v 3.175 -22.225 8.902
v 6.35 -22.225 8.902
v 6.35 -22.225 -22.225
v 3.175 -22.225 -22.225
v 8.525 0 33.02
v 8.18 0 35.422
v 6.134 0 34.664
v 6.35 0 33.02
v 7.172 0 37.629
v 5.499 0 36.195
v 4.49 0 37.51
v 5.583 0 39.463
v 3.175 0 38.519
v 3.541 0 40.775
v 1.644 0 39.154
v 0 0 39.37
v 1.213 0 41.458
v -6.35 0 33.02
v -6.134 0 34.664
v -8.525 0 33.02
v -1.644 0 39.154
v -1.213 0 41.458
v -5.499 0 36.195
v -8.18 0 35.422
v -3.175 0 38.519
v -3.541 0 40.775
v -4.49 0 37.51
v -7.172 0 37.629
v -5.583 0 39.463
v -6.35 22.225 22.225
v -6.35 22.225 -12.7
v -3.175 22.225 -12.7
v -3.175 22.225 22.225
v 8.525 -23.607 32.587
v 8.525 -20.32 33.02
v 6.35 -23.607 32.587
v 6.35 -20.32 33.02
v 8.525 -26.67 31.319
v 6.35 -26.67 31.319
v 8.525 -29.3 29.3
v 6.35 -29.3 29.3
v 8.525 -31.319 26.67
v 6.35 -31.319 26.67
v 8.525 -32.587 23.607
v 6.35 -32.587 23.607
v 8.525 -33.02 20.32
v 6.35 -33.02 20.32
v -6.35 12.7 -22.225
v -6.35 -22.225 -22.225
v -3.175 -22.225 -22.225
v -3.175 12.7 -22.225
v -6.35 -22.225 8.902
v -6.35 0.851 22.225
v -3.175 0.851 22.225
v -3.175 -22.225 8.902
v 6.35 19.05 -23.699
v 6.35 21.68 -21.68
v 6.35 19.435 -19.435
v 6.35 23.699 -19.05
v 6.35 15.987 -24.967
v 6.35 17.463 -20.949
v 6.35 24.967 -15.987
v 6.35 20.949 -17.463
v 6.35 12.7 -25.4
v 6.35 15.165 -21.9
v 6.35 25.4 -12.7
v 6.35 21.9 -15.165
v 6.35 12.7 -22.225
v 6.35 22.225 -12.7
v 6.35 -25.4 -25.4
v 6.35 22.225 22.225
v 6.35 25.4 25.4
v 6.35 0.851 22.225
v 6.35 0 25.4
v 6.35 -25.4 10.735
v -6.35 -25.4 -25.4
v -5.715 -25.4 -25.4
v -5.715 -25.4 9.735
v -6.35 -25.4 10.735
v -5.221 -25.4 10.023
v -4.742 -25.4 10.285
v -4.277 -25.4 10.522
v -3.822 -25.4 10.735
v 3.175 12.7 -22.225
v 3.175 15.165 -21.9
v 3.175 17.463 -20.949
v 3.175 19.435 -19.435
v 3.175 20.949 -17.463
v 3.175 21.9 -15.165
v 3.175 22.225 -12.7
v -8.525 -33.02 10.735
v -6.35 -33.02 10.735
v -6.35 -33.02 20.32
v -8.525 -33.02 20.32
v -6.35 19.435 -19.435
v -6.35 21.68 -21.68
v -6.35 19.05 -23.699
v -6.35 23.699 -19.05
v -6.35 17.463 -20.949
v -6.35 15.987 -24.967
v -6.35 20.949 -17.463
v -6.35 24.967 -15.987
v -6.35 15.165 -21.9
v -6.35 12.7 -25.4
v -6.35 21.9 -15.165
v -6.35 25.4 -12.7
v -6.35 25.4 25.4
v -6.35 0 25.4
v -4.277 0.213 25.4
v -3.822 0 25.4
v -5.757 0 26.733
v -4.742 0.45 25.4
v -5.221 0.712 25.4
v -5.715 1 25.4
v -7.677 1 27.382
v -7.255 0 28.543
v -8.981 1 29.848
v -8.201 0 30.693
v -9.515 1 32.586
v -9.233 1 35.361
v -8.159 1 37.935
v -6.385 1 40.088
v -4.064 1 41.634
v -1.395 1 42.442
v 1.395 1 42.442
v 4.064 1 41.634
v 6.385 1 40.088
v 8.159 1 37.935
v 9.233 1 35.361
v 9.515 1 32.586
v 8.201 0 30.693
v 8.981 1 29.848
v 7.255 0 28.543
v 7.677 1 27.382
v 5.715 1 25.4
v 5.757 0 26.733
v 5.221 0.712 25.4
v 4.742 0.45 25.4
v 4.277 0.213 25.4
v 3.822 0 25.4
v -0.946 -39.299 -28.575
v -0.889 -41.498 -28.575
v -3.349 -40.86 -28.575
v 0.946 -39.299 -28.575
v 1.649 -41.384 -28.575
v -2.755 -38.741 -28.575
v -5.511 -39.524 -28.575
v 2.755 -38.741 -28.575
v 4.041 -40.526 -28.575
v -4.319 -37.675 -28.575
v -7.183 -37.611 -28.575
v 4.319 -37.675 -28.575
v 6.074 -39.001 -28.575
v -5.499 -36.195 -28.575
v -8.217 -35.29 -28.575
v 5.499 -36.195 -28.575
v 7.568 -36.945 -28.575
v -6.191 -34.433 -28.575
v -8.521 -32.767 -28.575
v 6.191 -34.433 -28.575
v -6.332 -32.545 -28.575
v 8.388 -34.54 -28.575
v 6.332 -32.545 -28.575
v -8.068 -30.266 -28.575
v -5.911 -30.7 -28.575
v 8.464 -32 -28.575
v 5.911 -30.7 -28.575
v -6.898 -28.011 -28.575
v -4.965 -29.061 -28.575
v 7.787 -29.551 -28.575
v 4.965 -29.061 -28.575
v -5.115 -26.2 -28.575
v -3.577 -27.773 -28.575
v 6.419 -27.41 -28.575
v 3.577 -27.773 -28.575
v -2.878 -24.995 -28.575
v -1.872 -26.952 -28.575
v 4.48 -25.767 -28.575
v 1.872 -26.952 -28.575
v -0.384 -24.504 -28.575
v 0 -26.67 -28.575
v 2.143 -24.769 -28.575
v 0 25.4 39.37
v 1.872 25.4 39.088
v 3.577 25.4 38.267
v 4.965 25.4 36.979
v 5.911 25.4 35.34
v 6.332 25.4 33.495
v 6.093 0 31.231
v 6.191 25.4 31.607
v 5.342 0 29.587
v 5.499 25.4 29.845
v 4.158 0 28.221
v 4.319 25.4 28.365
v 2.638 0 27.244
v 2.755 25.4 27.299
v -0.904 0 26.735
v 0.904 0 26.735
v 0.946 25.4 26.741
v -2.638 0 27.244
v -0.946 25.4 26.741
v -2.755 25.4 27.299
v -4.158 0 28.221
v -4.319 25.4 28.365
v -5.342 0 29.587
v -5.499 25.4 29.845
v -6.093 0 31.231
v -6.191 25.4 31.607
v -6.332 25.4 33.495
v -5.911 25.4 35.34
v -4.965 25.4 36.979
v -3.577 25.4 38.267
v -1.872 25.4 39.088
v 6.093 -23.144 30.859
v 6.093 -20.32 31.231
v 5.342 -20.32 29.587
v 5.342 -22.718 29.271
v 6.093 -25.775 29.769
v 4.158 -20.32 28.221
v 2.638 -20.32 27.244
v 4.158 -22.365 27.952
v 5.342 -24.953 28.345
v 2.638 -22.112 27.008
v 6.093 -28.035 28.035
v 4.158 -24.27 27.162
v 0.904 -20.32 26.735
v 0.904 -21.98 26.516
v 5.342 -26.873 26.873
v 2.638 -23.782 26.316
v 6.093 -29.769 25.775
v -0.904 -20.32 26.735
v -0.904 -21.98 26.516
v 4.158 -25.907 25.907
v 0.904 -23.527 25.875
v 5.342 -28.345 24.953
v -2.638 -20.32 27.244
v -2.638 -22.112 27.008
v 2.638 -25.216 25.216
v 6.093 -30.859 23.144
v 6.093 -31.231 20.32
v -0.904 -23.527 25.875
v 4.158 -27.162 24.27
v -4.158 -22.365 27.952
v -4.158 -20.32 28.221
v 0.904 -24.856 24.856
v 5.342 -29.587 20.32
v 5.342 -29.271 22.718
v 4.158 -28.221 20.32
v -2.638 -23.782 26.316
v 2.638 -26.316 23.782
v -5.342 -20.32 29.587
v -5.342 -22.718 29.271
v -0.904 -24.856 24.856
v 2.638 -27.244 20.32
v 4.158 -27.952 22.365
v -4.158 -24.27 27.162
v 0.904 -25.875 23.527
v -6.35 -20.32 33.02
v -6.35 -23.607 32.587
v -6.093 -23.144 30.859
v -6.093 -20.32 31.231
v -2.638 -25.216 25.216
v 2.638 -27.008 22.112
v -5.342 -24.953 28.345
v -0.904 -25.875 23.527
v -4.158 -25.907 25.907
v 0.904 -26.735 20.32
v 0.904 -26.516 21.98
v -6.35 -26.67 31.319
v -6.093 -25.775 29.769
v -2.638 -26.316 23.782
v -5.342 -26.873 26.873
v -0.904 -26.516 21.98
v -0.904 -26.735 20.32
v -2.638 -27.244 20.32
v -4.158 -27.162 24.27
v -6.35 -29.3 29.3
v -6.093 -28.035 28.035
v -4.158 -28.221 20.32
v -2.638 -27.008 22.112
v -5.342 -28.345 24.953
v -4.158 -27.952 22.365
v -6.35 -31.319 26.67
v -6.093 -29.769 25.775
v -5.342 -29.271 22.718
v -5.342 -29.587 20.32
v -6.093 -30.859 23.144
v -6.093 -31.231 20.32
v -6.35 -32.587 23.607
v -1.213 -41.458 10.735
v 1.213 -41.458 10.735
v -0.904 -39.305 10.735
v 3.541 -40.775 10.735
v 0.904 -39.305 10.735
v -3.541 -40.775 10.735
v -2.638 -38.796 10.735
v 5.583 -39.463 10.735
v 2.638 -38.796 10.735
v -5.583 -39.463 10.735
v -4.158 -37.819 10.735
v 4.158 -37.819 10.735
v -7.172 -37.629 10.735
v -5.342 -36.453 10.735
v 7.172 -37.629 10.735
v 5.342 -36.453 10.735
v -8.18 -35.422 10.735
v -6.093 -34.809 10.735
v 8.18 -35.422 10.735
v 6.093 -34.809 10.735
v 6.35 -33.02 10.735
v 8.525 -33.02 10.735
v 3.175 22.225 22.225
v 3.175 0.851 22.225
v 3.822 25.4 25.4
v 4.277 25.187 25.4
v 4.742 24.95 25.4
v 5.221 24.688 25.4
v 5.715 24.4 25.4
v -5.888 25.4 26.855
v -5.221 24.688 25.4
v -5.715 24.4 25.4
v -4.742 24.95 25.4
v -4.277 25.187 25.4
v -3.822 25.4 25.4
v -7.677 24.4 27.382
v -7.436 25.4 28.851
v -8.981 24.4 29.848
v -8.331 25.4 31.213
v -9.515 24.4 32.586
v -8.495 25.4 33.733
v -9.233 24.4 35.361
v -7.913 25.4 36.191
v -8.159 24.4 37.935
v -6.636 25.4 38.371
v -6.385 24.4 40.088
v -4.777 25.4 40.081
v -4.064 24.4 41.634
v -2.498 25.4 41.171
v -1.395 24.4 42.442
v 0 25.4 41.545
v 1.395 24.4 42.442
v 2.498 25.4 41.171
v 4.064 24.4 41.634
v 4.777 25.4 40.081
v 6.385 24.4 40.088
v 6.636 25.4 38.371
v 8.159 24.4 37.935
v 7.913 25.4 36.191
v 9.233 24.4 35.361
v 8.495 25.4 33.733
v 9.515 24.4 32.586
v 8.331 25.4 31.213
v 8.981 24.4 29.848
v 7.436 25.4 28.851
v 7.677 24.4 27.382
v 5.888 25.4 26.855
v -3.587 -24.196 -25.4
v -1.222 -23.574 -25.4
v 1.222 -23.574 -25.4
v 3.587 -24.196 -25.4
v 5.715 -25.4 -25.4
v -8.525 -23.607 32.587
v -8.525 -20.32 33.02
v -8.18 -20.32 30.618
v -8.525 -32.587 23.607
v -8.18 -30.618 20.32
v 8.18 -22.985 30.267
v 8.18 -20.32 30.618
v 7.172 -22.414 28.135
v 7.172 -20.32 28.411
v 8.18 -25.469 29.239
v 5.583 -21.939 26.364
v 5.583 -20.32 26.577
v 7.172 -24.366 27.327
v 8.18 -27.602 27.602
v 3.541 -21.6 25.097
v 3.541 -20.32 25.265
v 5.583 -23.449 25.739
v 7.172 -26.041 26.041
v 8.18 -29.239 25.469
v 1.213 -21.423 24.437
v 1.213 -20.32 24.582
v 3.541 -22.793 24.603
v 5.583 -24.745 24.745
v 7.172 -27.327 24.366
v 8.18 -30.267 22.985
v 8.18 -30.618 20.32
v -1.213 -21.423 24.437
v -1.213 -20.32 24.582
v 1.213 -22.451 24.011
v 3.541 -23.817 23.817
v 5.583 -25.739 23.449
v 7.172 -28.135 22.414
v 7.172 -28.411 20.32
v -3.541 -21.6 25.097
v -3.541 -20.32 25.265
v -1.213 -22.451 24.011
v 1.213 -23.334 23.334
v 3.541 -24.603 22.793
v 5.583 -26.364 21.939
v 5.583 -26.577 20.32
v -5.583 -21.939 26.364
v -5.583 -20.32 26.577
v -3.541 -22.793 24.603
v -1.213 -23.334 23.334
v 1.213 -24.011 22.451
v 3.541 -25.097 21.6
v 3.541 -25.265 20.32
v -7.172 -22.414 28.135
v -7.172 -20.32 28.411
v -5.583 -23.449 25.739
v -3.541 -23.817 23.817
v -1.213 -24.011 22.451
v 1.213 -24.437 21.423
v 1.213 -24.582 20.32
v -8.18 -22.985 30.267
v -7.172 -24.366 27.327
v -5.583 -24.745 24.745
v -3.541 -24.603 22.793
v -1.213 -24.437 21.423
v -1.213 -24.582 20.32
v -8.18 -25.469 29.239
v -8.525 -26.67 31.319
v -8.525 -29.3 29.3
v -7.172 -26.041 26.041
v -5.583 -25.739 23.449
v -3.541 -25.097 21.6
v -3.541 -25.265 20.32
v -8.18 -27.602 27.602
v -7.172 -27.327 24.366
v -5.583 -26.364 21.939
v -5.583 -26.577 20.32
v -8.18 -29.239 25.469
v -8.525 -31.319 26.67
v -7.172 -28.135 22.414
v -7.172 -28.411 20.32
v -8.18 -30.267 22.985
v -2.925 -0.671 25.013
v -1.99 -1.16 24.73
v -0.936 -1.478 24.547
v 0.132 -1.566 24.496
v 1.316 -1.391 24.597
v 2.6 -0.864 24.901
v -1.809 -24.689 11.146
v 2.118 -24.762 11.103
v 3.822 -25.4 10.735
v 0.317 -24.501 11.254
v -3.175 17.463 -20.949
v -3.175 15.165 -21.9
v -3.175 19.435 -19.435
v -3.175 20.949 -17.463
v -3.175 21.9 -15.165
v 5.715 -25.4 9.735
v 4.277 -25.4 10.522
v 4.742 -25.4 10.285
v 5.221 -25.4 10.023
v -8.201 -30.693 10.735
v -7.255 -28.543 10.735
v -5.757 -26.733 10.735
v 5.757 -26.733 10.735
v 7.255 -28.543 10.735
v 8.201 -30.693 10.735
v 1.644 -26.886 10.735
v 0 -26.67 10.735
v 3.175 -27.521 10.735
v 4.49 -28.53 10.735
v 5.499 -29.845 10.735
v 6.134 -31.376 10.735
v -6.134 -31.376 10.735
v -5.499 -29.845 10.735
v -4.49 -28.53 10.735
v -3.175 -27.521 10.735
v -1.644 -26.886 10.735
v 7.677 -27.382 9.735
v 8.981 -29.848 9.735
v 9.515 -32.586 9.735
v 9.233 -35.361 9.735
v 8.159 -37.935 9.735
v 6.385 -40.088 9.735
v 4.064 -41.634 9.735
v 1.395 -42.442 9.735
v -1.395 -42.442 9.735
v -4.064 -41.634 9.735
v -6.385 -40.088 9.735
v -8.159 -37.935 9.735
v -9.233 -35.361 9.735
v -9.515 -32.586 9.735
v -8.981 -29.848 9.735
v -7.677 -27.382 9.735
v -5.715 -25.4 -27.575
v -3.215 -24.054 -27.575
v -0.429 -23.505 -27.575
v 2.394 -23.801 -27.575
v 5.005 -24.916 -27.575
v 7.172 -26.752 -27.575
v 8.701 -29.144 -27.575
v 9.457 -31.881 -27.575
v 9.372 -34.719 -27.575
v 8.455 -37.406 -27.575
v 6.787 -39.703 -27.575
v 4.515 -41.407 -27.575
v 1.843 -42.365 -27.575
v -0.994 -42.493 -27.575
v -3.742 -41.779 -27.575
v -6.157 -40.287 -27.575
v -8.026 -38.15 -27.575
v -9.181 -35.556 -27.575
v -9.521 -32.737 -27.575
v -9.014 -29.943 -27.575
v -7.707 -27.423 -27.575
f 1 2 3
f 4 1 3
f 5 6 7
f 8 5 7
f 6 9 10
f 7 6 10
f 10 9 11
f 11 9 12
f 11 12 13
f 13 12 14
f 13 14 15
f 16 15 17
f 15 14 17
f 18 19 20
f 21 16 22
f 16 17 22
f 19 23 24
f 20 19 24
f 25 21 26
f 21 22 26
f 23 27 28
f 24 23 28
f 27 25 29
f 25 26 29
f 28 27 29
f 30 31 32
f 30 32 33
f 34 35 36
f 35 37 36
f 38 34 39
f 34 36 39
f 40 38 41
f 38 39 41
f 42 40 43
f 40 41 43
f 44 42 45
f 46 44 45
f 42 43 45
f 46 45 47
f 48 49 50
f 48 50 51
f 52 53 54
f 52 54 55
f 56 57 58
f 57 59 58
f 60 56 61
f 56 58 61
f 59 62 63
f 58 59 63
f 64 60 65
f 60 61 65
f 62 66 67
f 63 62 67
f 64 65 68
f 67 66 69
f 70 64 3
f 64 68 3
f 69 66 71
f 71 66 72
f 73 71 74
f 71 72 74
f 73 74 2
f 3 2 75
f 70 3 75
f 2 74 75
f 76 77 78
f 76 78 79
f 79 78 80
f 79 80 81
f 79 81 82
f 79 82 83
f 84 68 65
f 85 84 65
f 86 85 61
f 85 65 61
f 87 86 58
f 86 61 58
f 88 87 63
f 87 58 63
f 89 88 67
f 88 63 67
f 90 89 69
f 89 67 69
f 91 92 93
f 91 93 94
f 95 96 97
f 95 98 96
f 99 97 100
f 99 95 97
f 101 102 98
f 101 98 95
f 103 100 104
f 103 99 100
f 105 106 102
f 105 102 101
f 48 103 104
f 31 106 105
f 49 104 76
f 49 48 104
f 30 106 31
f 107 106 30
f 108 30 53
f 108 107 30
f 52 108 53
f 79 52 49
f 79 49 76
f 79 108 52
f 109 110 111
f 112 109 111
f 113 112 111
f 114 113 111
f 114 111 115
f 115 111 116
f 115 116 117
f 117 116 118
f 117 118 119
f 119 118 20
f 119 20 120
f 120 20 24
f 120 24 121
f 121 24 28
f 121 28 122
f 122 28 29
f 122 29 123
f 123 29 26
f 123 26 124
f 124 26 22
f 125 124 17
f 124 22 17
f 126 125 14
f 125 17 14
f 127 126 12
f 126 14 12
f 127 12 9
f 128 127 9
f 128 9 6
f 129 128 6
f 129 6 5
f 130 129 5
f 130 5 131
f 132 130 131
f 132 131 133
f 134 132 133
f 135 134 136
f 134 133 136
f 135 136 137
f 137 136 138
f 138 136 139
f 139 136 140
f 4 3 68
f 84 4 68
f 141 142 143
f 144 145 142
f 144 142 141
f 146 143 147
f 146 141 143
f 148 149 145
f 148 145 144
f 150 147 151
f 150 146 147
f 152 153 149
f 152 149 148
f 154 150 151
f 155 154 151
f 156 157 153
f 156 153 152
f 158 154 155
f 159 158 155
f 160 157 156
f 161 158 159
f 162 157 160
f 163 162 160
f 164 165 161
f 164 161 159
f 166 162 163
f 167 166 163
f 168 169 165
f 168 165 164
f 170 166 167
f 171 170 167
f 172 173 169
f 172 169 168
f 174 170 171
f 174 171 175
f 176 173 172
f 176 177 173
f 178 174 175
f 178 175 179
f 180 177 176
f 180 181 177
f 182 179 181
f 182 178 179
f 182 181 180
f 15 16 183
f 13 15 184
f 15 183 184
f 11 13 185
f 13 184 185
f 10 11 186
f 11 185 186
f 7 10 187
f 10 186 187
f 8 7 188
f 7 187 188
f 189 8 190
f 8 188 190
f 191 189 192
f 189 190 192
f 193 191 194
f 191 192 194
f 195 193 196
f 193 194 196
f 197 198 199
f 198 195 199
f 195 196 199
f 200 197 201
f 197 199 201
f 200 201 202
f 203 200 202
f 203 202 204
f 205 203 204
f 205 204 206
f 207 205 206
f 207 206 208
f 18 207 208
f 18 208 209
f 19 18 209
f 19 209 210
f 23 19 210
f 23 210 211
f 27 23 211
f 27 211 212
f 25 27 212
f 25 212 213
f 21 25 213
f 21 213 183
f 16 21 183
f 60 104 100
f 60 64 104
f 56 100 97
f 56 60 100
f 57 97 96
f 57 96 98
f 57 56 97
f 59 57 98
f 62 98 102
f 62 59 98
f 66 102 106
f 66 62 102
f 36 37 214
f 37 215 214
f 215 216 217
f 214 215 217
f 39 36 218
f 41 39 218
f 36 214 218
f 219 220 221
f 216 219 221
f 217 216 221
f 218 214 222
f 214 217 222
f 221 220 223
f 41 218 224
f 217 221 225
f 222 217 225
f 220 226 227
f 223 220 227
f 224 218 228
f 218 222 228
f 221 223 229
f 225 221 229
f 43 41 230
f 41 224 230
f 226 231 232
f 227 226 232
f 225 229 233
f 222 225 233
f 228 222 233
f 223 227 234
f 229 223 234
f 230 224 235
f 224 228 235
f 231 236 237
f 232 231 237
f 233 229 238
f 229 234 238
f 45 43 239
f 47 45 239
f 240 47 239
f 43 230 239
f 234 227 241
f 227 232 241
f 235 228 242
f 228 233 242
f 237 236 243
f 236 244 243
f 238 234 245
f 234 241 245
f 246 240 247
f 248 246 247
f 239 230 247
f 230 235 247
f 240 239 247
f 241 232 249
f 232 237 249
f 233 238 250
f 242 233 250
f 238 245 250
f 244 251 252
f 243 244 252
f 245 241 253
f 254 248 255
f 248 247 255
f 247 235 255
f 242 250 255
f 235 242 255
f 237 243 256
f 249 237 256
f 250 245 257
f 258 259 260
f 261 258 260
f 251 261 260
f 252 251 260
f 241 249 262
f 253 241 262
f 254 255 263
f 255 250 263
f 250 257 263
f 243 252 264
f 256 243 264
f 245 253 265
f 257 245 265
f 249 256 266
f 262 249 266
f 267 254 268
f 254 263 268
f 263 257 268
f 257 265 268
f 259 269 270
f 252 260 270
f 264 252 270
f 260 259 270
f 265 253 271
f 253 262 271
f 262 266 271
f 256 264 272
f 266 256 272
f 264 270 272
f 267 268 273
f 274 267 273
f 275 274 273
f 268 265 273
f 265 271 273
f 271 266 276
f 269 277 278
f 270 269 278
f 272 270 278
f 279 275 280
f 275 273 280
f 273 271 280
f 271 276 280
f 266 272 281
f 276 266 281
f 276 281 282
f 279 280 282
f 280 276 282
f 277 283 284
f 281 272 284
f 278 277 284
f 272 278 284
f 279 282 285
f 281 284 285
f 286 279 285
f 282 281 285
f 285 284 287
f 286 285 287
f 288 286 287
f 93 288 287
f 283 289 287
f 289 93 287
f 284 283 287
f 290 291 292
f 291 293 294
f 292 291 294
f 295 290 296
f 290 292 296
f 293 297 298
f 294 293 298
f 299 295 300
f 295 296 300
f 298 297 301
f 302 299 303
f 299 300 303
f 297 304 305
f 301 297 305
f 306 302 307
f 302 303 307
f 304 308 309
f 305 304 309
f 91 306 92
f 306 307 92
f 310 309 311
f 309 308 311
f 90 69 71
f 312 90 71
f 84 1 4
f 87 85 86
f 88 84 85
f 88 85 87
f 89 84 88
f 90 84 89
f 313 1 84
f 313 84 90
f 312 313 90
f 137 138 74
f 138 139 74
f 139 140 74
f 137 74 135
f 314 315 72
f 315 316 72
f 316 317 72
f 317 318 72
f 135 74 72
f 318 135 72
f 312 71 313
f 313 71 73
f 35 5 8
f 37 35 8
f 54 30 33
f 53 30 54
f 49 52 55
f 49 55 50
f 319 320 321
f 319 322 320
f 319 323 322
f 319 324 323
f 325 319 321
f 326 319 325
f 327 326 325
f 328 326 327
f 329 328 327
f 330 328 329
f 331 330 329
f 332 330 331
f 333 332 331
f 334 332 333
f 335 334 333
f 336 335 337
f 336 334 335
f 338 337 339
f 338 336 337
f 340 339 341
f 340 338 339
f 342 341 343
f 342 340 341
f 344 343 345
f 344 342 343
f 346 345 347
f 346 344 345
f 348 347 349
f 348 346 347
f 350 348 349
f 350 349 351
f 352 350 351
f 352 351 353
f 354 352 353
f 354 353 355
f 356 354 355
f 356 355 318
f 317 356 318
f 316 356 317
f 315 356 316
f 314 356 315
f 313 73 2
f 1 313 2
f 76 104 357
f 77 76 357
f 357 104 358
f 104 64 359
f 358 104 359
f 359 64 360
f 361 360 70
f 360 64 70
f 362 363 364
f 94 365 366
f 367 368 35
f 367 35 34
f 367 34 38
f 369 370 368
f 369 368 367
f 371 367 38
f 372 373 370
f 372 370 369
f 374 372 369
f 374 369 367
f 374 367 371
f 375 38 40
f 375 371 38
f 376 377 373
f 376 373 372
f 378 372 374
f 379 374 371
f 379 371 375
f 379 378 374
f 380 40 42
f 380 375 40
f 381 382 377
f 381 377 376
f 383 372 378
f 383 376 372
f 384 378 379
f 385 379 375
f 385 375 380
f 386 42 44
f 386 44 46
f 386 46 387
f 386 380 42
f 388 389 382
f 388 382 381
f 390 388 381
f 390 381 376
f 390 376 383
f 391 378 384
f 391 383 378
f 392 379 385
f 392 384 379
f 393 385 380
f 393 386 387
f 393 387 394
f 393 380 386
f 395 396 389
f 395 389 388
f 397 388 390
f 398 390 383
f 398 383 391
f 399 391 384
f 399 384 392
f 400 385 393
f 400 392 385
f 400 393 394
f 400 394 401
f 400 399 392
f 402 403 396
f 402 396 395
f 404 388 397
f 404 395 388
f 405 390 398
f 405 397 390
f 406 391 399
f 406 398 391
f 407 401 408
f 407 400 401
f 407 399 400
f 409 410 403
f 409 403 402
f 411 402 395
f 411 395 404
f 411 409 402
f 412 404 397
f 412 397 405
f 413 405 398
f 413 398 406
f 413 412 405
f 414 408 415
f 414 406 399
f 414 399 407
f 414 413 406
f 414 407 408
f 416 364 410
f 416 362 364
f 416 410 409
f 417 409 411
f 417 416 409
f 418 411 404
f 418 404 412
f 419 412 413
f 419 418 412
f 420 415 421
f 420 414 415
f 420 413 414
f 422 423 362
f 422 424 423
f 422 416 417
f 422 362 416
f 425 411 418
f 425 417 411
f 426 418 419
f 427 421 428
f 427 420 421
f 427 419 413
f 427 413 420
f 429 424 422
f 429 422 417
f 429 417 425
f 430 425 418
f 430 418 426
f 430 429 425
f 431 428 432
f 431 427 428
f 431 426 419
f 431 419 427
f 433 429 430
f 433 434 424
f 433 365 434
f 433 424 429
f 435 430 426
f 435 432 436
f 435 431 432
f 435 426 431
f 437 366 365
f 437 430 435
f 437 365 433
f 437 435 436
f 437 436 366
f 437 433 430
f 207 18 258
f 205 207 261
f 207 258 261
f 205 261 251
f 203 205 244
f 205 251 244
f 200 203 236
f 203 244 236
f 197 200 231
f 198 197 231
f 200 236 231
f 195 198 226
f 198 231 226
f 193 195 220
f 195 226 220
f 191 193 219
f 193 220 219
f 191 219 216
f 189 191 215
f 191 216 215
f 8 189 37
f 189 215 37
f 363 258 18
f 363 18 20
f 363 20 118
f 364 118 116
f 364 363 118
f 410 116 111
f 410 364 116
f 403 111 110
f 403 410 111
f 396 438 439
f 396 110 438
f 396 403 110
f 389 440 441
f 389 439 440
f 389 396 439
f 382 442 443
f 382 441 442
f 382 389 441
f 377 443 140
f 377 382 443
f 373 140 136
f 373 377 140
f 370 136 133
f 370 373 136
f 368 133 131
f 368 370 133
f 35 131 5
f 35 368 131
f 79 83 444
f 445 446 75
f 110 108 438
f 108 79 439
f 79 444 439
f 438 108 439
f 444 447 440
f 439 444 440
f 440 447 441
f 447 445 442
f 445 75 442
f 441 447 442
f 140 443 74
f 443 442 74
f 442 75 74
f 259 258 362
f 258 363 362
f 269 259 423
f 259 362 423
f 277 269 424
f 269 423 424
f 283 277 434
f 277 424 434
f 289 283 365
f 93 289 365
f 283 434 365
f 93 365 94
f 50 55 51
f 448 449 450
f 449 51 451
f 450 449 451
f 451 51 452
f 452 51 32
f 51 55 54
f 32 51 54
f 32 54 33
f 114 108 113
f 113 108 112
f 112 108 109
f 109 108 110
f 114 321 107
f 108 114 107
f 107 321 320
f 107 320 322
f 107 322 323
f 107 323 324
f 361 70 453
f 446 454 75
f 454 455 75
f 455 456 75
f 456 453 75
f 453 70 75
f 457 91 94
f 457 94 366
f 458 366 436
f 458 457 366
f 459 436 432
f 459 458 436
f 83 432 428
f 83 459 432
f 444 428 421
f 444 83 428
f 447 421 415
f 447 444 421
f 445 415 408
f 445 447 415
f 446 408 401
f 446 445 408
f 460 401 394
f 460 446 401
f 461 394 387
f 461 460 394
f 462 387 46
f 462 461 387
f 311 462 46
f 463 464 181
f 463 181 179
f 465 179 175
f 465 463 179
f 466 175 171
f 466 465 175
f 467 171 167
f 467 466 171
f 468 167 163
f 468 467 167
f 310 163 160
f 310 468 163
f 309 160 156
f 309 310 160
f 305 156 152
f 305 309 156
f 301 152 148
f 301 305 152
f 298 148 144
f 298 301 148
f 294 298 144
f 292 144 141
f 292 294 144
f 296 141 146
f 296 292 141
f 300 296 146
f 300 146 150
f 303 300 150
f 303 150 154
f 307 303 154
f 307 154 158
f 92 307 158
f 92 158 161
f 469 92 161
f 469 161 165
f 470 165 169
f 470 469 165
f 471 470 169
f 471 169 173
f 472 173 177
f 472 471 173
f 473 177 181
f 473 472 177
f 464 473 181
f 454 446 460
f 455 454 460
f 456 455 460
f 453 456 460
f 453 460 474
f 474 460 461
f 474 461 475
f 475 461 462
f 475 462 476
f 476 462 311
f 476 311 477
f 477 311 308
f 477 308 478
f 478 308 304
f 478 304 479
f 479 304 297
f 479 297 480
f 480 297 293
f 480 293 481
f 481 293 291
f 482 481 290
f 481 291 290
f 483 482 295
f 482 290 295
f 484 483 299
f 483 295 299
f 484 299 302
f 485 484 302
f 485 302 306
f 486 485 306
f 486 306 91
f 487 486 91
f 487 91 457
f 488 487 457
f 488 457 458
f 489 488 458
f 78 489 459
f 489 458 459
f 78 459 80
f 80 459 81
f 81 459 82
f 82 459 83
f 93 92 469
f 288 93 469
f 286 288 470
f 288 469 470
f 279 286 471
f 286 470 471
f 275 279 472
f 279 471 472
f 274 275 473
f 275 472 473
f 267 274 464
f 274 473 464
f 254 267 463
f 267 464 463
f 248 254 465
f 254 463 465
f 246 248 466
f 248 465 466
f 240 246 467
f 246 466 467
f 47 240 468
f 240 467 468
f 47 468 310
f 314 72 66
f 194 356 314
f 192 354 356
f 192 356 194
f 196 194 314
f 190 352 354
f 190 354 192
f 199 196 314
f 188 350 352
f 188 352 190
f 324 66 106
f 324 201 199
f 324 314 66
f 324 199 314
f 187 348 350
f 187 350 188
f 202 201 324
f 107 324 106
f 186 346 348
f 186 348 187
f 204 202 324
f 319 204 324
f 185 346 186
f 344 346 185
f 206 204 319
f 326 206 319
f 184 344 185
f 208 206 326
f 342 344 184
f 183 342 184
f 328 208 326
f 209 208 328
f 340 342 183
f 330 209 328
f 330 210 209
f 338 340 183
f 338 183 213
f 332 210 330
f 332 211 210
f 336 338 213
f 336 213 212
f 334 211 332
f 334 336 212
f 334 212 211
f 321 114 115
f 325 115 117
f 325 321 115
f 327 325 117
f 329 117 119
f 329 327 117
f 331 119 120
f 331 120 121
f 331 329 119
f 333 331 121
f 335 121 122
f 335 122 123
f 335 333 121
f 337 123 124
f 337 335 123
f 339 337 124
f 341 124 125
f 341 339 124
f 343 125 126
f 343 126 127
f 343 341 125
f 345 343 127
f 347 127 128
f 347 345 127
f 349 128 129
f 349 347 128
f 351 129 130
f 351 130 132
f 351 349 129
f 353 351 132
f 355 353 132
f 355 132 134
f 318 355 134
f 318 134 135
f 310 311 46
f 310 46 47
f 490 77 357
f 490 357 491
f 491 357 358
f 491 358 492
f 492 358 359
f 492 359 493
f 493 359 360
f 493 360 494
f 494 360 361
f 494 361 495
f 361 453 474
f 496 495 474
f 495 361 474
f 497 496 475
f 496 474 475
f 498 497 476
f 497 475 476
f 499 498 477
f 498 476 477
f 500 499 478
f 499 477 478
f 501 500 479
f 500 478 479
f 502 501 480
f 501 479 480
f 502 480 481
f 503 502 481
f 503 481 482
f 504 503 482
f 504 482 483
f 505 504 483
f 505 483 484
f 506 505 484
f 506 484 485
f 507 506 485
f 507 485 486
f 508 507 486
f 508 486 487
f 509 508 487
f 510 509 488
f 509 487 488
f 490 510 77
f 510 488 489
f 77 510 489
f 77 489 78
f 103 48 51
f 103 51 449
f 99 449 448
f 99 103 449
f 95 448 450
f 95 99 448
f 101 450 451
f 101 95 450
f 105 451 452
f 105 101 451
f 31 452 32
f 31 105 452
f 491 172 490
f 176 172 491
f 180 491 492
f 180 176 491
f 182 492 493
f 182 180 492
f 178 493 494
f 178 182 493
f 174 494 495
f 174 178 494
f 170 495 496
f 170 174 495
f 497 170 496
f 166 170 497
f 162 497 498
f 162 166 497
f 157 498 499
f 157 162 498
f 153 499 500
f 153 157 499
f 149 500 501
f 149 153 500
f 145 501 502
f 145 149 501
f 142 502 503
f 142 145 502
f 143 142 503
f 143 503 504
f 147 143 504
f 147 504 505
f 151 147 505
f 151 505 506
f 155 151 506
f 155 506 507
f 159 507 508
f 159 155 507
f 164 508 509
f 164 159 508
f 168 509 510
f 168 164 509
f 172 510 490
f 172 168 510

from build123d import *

# Parameters (mm, degrees)
BOSS_EXTRUDE1_DEPTH      = 6.35
FILLET1_R                = 12.7
CUT_EXTRUDE2_DEPTH       = 3.175
BOSS_EXTRUDE2_DEPTH      = 3.175
BOSS_EXTRUDE2_DEPTH_BACK = 36.135303
SKETCH4_R                = 9.525
SKETCH4_R_2              = 6.35
SKETCH5_R                = 9.525
SKETCH5_R_2              = 6.35
BOSS_EXTRUDE3_DEPTH      = 25.4
CHAMFER2_SIZE            = 1


with BuildPart() as part:
    # Sketch1 → Boss-Extrude1 (new, symmetric)
    with BuildSketch(Plane.YZ):
        Polygon((-25.4, 10.735303163), (0, 25.4), (25.4, 25.4), (25.4, -25.4), (-25.4, -25.4), align=None)
    extrude(amount=BOSS_EXTRUDE1_DEPTH, both=True)

    # Fillet1
    fillet1_edges = [part.edges().sort_by_distance(p)[0] for p in [
        (0, 25.4, -25.4),
    ]]
    fillet(fillet1_edges, radius=FILLET1_R)

    # Sketch3 → Cut-Extrude2 (cut)
    with BuildSketch(Plane.YZ.offset(6.35)):
        with BuildLine():
            Line((-22.225, -22.225), (12.7, -22.225))
            ThreePointArc((12.7, -22.225), (19.435192091, -19.435192091), (22.225, -12.7))
            Line((22.225, -12.7), (22.225, 22.225))
            Line((22.225, 22.225), (0.850738686, 22.225))
            Line((0.850738686, 22.225), (-22.225, 8.902216058))
            Line((-22.225, 8.902216058), (-22.225, -22.225))
        make_face()
    cut_extrude2 = extrude(amount=-CUT_EXTRUDE2_DEPTH, mode=Mode.SUBTRACT)

    # Mirror1: Cut-Extrude2 across plane
    add(cut_extrude2.mirror(Plane(origin=(0, 0, 0), x_dir=(0, 0, 1), z_dir=(1, 0, 0))), mode=Mode.SUBTRACT)

    # Sketch4 → Boss-Extrude2 (add, two sides: drawn at the far end of the back side and taken through both)
    with BuildSketch(Plane(origin=(0, 0, -25.4), x_dir=(1, 0, 0), z_dir=(0, 0, -1)).offset(-BOSS_EXTRUDE2_DEPTH_BACK)):
        with Locations(Location((0, 33.02, 0), (0, 0, 233.130102354))):
            Circle(SKETCH4_R)
        with Locations(Location((0, 33.02, 0), (0, 0, 270))):
            Circle(SKETCH4_R_2, mode=Mode.SUBTRACT)
    extrude(amount=BOSS_EXTRUDE2_DEPTH + BOSS_EXTRUDE2_DEPTH_BACK)

    # Sketch5 → Boss-Extrude3 (add)
    with BuildSketch(Plane(origin=(0, 25.4, 0), x_dir=(-1, 0, 0), z_dir=(0, 1, 0))):
        with Locations((0, 33.02)):
            Circle(SKETCH5_R)
        with Locations(Location((0, 33.02, 0), (0, 0, 90))):
            Circle(SKETCH5_R_2, mode=Mode.SUBTRACT)
    extrude(amount=-BOSS_EXTRUDE3_DEPTH)

    # Chamfer2
    # the kernel refuses this chamfer: 1 mm, written as the material it takes off along each edge
    with BuildSketch(Plane(origin=(0, -33.02, 10.735303), x_dir=(0.3638595085405839, 0.931453841070294, 0), z_dir=(-0.931453841070294, 0.3638595085405839, 0))) as chamfer2_piece_1_section:
        Polygon((9.525, CHAMFER2_SIZE), (9.525 - CHAMFER2_SIZE, 0), (9.525, 0), align=None)
    chamfer2_piece_1 = revolve(axis=Axis((0, -33.02, 10.735303), (0, 0, -1)), revolution_arc=317.325176487, mode=Mode.PRIVATE)
    chamfer2_piece_1 = split(chamfer2_piece_1, bisect_by=Plane(origin=(5.777045626, -25.4, 10.24862198), z_dir=(0, -1, 0)), keep=Keep.TOP, mode=Mode.PRIVATE)
    add(chamfer2_piece_1, mode=Mode.SUBTRACT)
    with BuildSketch(Plane(origin=(0, -33.02, -28.575), x_dir=(-0.6000000000021781, 0.7999999999983665, 0), z_dir=(-0.7999999999983665, -0.6000000000021781, 0))) as chamfer2_piece_2:
        Polygon((9.525, -CHAMFER2_SIZE), (9.525 - CHAMFER2_SIZE, 0), (9.525, 0), align=None)
    revolve(axis=Axis((0, -33.02, -28.575), (0, 0, -1)), mode=Mode.SUBTRACT)
    with BuildSketch(Plane(origin=(0, 25.4, 33.02), x_dir=(-0.3638595085405501, 0, -0.9314538410703074), z_dir=(0.9314538410703074, 0, -0.3638595085405501))) as chamfer2_piece_3_section:
        Polygon((9.525, -CHAMFER2_SIZE), (9.525 - CHAMFER2_SIZE, 0), (9.525, 0), align=None)
    chamfer2_piece_3 = revolve(axis=Axis((0, 25.4, 33.02), (0, 1, 0)), revolution_arc=317.325176487, mode=Mode.PRIVATE)
    chamfer2_piece_3 = split(chamfer2_piece_3, bisect_by=Plane(origin=(0, 24.920234358, 25.4), z_dir=(0, 0, 1)), keep=Keep.TOP, mode=Mode.PRIVATE)
    add(chamfer2_piece_3, mode=Mode.SUBTRACT)
    with BuildSketch(Plane(origin=(0, 0, 33.02), x_dir=(-0.3638595085405531, 0, -0.9314538410703063), z_dir=(0.9314538410703063, 0, -0.3638595085405531))) as chamfer2_piece_4_section:
        Polygon((9.525, CHAMFER2_SIZE), (9.525 - CHAMFER2_SIZE, 0), (9.525, 0), align=None)
    chamfer2_piece_4 = revolve(axis=Axis((0, 0, 33.02), (0, 1, 0)), revolution_arc=317.325176487, mode=Mode.PRIVATE)
    chamfer2_piece_4 = split(chamfer2_piece_4, bisect_by=Plane(origin=(-5.452412952, 0.490850729, 25.4), z_dir=(0, 0, 1)), keep=Keep.TOP, mode=Mode.PRIVATE)
    add(chamfer2_piece_4, mode=Mode.SUBTRACT)

    # Sweep3: sweep along a path in Sketch6
    with BuildLine(Plane.YZ) as sweep3_path:
        Line((0, 33.02), (-20.32, 33.02))
        ThreePointArc((-20.32, 33.02), (-29.300256121, 29.300256121), (-33.02, 20.32))
        Line((-33.02, 20.32), (-33.02, 10.735303163))
    # Sketch7 → Sweep3 (sweep)
    with BuildSketch(Plane.XZ):
        with BuildLine():
            Line((-8.525, 33.02), (-6.35, 33.02))
            ThreePointArc((-6.35, 33.02), (0, 26.67), (6.35, 33.02))
            Line((6.35, 33.02), (8.525, 33.02))
            ThreePointArc((8.525, 33.02), (0, 24.495), (-8.525, 33.02))
        make_face()
    sweep(path=sweep3_path.line)


solid = part.part
